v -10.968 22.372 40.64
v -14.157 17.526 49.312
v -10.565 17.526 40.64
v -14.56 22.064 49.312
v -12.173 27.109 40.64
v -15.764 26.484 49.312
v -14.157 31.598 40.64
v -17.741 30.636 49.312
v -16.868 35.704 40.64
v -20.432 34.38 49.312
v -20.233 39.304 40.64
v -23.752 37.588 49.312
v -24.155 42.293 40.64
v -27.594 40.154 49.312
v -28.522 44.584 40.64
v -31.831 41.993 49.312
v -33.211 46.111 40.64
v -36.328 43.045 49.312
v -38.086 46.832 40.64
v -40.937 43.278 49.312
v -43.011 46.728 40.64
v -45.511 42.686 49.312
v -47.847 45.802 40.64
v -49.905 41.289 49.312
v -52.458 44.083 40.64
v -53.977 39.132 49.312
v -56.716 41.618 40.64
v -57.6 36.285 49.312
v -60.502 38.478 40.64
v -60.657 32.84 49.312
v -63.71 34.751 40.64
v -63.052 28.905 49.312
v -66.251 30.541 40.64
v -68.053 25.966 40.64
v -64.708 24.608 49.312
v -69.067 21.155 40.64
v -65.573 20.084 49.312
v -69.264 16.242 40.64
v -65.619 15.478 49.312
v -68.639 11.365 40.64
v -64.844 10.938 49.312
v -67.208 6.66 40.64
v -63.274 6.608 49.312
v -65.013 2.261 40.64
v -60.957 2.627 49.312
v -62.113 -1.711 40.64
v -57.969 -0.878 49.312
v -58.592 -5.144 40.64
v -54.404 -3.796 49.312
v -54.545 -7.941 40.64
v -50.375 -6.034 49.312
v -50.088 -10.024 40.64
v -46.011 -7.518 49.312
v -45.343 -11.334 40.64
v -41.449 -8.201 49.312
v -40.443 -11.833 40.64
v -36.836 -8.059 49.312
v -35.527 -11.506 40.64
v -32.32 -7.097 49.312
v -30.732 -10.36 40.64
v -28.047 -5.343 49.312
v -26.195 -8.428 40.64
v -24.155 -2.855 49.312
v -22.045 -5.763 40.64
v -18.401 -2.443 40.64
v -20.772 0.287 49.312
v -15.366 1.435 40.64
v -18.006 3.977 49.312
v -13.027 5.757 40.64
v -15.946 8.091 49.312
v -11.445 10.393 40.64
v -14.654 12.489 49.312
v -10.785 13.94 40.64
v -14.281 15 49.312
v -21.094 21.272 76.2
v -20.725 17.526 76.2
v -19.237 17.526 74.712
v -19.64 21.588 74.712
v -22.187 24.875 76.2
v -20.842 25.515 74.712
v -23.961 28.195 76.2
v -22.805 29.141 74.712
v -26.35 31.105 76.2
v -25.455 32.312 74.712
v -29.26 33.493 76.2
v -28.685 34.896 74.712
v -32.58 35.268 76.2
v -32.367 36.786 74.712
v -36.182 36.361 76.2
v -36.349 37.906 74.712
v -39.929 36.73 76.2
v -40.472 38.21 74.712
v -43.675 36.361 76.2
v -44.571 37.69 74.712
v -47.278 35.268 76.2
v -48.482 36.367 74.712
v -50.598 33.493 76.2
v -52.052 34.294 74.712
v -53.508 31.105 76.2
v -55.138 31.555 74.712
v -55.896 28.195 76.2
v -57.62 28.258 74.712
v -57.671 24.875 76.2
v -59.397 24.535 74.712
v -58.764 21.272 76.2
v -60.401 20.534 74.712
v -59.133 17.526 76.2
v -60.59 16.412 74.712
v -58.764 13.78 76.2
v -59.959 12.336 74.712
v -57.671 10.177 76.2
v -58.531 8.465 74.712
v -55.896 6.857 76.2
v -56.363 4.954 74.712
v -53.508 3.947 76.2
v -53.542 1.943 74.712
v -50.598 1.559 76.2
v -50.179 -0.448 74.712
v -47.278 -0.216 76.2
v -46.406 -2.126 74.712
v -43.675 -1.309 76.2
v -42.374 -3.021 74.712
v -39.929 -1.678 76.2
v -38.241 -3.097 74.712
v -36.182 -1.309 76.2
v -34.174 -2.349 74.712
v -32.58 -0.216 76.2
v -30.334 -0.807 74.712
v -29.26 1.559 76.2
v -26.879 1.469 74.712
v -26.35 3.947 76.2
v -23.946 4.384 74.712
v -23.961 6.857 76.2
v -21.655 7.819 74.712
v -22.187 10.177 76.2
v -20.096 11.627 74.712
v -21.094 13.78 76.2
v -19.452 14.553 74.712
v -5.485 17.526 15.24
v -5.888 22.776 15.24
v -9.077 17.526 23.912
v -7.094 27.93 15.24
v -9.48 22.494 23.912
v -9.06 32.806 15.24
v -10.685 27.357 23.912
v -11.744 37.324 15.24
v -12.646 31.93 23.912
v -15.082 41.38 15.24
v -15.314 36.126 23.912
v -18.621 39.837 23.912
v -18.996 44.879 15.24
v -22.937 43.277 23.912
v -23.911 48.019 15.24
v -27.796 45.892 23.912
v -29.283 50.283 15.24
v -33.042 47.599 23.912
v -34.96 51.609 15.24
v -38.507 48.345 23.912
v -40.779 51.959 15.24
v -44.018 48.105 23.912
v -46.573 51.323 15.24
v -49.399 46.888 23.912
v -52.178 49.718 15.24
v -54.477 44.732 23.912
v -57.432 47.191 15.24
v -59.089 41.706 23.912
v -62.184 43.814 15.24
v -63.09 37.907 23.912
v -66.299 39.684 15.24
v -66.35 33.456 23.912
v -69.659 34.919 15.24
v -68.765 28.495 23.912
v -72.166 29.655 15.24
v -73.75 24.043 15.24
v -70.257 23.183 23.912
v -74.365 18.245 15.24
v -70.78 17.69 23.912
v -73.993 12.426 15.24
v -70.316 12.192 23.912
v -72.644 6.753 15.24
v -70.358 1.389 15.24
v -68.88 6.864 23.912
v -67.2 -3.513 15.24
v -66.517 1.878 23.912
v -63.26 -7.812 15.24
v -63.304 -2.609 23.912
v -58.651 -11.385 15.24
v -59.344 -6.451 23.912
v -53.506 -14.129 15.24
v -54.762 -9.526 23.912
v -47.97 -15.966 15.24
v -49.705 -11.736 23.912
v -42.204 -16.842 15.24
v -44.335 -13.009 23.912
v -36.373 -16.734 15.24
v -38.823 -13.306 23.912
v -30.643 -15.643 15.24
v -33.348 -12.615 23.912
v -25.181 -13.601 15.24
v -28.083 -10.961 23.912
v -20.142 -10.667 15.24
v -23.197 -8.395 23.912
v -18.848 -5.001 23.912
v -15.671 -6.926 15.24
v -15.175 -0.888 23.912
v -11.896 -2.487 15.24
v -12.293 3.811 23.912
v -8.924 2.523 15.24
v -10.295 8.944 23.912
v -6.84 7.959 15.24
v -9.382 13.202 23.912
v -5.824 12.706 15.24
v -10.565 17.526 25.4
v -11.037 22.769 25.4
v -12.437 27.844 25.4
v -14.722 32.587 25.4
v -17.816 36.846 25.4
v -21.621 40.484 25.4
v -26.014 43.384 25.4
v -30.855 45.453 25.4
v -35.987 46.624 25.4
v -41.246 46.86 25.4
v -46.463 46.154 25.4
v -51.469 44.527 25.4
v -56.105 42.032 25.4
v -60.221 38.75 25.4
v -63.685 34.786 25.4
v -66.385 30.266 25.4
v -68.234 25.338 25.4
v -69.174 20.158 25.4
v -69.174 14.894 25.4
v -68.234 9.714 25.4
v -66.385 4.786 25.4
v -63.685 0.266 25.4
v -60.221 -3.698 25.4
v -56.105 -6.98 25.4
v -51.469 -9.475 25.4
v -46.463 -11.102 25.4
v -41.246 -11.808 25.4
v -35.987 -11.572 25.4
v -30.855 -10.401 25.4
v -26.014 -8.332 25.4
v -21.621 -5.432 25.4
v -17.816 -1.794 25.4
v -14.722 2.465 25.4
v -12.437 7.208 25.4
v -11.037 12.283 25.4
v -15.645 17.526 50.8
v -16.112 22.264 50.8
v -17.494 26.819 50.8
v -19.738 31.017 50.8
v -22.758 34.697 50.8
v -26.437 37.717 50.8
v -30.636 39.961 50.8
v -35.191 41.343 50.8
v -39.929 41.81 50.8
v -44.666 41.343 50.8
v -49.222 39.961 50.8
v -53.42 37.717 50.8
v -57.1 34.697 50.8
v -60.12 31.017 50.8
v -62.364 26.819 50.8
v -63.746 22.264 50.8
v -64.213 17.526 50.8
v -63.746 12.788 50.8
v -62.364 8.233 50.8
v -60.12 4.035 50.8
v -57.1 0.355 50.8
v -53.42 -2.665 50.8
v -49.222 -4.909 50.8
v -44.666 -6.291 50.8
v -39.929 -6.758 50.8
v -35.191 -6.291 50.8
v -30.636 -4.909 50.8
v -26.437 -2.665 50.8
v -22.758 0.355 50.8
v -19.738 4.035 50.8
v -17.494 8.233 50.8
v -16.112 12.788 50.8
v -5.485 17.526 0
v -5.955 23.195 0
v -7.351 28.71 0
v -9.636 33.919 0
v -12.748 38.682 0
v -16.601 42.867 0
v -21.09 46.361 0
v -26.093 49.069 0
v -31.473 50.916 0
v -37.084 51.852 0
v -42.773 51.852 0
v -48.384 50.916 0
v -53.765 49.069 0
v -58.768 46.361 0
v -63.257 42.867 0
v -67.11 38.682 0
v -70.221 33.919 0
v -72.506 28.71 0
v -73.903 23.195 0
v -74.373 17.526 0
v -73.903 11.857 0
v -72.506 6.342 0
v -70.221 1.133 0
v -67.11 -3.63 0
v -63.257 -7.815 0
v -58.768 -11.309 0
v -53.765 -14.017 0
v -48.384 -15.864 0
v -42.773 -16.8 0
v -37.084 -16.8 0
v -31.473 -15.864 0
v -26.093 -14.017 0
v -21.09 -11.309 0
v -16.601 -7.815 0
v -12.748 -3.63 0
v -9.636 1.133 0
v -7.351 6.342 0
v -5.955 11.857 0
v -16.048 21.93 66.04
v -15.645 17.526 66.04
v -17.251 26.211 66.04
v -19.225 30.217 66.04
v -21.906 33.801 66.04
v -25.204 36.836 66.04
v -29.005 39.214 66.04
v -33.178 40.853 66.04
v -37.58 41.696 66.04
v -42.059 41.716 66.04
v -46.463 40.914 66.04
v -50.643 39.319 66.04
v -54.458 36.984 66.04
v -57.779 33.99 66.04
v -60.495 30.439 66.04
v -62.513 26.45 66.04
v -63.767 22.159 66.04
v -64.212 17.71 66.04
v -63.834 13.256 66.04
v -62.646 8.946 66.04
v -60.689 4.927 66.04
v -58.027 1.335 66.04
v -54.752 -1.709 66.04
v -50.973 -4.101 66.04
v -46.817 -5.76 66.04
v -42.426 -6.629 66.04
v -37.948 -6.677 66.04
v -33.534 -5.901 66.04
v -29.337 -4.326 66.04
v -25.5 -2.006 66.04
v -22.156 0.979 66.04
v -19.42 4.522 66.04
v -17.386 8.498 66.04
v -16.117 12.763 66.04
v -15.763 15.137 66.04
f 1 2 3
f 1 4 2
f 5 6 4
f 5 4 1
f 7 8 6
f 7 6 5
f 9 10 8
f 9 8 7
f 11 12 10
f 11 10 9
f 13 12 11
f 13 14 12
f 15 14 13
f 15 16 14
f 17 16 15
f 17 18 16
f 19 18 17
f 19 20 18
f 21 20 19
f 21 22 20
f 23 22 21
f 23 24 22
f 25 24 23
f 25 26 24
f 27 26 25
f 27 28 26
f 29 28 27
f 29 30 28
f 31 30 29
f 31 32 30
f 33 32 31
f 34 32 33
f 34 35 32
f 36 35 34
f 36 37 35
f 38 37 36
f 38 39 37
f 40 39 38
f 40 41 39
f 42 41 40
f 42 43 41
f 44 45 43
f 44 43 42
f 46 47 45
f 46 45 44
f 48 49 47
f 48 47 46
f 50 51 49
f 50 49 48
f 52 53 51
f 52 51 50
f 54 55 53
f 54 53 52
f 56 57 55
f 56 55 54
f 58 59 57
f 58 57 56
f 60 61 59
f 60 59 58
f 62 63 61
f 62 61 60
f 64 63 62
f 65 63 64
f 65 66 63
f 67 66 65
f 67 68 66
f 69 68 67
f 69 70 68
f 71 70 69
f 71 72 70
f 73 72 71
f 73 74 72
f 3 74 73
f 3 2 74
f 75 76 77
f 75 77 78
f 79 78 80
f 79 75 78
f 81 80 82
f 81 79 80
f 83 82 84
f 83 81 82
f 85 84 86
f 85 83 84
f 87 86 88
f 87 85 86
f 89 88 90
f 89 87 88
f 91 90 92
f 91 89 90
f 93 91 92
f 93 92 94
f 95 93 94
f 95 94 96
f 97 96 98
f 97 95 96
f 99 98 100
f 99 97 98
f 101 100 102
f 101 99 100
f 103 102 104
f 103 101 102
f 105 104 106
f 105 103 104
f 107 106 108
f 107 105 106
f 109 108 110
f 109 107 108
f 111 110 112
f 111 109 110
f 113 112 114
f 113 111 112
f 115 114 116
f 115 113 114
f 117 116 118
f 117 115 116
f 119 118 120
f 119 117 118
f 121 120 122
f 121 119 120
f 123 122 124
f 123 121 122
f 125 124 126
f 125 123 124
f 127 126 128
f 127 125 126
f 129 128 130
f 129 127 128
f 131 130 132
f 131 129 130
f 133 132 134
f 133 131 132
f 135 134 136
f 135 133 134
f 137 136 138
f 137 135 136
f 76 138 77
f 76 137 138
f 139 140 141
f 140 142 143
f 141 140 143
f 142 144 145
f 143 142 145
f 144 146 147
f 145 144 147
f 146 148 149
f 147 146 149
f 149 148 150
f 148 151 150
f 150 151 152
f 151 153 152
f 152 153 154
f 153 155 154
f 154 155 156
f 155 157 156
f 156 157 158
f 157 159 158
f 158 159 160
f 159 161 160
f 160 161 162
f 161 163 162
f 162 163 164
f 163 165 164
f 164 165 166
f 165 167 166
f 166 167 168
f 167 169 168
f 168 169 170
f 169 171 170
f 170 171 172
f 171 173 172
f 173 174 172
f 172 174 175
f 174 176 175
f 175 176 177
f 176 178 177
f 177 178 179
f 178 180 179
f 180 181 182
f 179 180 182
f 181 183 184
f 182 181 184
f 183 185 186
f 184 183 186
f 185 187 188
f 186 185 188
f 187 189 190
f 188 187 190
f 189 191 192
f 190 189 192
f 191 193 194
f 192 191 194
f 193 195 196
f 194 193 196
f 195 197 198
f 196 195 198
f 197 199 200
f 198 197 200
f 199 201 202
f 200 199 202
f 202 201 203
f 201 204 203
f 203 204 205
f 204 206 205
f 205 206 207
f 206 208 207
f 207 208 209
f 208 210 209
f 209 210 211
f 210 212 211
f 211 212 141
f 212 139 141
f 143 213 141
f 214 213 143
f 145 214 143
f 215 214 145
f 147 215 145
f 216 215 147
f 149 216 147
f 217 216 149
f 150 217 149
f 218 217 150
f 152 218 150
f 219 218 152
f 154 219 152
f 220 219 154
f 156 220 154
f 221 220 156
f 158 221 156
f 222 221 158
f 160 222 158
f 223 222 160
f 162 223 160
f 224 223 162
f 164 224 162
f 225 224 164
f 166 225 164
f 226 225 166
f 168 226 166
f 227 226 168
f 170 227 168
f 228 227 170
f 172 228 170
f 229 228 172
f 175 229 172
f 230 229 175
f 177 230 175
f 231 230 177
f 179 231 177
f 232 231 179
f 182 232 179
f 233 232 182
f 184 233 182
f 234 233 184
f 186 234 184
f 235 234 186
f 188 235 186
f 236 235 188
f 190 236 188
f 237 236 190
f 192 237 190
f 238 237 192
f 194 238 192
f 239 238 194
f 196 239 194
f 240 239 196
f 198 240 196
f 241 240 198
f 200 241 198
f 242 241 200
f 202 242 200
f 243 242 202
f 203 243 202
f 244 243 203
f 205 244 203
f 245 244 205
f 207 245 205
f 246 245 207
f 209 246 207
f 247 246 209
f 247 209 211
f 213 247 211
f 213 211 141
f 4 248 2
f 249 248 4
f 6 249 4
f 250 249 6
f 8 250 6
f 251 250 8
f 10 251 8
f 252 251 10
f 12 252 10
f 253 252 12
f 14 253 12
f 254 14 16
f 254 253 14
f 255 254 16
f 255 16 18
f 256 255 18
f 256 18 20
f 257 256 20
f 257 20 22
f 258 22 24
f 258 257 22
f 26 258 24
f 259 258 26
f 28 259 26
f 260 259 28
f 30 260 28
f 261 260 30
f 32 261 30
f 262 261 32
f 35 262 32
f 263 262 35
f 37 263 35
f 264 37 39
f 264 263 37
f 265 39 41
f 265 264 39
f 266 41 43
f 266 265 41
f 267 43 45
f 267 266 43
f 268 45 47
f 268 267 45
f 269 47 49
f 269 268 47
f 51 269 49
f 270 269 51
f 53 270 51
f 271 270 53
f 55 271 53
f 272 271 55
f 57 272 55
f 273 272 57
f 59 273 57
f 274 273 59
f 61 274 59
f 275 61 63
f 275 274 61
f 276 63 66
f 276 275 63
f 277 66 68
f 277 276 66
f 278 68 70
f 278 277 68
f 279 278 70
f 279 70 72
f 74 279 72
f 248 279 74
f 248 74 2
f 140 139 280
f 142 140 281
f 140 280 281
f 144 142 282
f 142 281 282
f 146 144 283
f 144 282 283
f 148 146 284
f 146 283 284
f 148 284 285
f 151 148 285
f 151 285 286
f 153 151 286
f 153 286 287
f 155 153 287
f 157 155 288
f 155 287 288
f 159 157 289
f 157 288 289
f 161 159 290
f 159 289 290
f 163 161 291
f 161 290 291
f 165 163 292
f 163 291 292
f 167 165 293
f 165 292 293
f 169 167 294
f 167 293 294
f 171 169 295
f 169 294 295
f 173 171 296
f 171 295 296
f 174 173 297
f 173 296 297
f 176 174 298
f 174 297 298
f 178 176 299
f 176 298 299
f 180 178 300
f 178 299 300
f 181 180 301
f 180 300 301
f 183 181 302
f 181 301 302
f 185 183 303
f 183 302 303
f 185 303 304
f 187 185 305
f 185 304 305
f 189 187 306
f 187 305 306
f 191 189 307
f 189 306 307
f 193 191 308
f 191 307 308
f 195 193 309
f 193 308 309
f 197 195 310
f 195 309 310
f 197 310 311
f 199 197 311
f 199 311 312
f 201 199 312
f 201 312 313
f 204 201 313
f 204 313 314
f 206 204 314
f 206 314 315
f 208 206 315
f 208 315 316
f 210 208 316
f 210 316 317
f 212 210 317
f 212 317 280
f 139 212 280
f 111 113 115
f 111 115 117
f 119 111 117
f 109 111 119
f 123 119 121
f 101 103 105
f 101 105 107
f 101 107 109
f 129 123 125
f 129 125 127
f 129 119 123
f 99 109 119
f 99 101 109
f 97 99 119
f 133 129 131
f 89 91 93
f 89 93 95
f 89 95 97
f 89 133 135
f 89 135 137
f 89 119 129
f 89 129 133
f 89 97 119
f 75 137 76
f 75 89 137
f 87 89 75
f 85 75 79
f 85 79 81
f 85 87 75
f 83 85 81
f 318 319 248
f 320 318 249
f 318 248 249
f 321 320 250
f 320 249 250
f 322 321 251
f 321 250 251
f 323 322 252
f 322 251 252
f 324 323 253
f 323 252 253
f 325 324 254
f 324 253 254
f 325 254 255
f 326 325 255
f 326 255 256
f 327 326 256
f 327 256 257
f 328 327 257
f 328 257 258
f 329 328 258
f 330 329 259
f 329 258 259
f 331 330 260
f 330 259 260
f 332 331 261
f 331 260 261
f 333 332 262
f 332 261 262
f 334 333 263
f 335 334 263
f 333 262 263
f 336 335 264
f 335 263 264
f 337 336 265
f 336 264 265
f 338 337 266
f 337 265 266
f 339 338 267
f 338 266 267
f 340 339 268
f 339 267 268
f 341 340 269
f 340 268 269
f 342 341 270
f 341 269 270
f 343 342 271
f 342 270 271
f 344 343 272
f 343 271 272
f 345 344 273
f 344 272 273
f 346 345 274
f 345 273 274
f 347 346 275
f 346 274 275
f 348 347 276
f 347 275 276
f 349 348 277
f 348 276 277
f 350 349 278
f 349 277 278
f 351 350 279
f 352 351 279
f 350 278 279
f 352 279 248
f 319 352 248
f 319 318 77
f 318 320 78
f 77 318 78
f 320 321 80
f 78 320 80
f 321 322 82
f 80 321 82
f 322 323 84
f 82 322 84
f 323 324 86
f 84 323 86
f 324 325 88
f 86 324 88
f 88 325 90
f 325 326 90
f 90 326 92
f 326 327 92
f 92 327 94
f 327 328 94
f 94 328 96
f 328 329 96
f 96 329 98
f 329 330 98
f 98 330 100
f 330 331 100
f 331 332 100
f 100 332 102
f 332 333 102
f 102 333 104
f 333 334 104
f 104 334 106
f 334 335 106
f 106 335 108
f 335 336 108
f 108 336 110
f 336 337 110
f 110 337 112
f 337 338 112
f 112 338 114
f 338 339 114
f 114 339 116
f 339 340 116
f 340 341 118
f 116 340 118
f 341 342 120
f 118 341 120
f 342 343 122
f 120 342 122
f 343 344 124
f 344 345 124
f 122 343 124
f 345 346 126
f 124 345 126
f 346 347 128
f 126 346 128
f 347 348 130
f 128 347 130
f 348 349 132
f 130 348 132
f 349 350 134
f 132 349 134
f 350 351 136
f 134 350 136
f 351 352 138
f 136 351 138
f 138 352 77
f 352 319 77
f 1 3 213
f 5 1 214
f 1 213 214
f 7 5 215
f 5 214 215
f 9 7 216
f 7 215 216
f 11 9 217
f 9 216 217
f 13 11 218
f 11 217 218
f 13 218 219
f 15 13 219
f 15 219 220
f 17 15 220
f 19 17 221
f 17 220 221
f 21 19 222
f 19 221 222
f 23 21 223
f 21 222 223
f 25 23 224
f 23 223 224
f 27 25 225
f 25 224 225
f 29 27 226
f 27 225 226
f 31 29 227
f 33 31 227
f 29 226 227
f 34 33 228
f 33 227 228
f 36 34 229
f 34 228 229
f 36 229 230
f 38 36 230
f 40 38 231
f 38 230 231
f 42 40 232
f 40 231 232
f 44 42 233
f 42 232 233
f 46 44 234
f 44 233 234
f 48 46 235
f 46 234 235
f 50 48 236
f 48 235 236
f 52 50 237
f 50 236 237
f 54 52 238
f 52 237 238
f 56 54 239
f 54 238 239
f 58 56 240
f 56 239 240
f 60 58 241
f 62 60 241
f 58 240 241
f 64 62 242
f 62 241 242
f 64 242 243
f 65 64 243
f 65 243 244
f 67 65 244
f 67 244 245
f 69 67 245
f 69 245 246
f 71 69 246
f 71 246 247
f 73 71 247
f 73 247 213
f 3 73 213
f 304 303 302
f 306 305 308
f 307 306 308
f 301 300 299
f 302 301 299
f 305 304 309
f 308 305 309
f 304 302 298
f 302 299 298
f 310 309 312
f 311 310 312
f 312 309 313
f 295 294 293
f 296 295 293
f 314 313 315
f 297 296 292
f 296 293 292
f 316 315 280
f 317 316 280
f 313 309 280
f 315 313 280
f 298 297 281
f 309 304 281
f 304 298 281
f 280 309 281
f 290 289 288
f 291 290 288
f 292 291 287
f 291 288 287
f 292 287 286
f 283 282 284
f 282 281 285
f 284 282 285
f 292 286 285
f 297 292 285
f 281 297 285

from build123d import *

# Parameters (mm, degrees)
F0_R     = 34.44374921
F1_DEPTH = 25.4
F2_SIZE  = 5.08
F3_SIZE  = 5.08
F4_DEPTH = 25.4
F5_SIZE  = 5.08
F6_DEPTH = 25.4
F7_SIZE  = 5.08
F8_SIZE  = 5.08


# Not quite as in the source:
# - two fillets or chamfers of one size are made in one step


with BuildPart() as f1:
    # F0 (on Top) → F1 (new body)
    with BuildSketch(Plane.XY):
        with Locations((-39.9288013577, 17.5260007381)):
            Circle(F0_R)
    extrude(amount=F1_DEPTH)

    # F2
    f2_edges = [f1.edges().sort_by_distance(p)[0] for p in [
        (-74.372551, 17.526001, 25.4),
    ]]
    chamfer(f2_edges, length=F2_SIZE)

    # F3
    f3_edges = [f1.edges().sort_by_distance(p)[0] for p in [
        (-74.372551, 17.526001, 20.32),
    ]]
    chamfer(f3_edges, length=F3_SIZE)

    # F4 (add): a face of the model
    f4_faces = [f1.faces().sort_by_distance(p)[0] for p in [
        (-39.9288013577, 17.5260007381, 25.4),
    ]]
    extrude(f4_faces, amount=F4_DEPTH)

    # F5
    f5_edges = [f1.edges().sort_by_distance(p)[0] for p in [
        (-69.292551, 17.526001, 50.8),
    ]]
    chamfer(f5_edges, length=F5_SIZE)

    # F6 (add): a face of the model
    f6_faces = [f1.faces().sort_by_distance(p)[0] for p in [
        (-39.9288013577, 17.5260007381, 50.8),
    ]]
    extrude(f6_faces, amount=F6_DEPTH)

    # F7
    f7_edges = [f1.edges().sort_by_distance(p)[0] for p in [
        (-69.292551, 17.526001, 45.72),
        (-64.212551, 17.526001, 76.2),
    ]]
    chamfer(f7_edges, length=F7_SIZE)

    # F8
    f8_edges = [f1.edges().sort_by_distance(p)[0] for p in [
        (-64.212551, 17.526001, 71.12),
    ]]
    chamfer(f8_edges, length=F8_SIZE)


solid = f1.part
